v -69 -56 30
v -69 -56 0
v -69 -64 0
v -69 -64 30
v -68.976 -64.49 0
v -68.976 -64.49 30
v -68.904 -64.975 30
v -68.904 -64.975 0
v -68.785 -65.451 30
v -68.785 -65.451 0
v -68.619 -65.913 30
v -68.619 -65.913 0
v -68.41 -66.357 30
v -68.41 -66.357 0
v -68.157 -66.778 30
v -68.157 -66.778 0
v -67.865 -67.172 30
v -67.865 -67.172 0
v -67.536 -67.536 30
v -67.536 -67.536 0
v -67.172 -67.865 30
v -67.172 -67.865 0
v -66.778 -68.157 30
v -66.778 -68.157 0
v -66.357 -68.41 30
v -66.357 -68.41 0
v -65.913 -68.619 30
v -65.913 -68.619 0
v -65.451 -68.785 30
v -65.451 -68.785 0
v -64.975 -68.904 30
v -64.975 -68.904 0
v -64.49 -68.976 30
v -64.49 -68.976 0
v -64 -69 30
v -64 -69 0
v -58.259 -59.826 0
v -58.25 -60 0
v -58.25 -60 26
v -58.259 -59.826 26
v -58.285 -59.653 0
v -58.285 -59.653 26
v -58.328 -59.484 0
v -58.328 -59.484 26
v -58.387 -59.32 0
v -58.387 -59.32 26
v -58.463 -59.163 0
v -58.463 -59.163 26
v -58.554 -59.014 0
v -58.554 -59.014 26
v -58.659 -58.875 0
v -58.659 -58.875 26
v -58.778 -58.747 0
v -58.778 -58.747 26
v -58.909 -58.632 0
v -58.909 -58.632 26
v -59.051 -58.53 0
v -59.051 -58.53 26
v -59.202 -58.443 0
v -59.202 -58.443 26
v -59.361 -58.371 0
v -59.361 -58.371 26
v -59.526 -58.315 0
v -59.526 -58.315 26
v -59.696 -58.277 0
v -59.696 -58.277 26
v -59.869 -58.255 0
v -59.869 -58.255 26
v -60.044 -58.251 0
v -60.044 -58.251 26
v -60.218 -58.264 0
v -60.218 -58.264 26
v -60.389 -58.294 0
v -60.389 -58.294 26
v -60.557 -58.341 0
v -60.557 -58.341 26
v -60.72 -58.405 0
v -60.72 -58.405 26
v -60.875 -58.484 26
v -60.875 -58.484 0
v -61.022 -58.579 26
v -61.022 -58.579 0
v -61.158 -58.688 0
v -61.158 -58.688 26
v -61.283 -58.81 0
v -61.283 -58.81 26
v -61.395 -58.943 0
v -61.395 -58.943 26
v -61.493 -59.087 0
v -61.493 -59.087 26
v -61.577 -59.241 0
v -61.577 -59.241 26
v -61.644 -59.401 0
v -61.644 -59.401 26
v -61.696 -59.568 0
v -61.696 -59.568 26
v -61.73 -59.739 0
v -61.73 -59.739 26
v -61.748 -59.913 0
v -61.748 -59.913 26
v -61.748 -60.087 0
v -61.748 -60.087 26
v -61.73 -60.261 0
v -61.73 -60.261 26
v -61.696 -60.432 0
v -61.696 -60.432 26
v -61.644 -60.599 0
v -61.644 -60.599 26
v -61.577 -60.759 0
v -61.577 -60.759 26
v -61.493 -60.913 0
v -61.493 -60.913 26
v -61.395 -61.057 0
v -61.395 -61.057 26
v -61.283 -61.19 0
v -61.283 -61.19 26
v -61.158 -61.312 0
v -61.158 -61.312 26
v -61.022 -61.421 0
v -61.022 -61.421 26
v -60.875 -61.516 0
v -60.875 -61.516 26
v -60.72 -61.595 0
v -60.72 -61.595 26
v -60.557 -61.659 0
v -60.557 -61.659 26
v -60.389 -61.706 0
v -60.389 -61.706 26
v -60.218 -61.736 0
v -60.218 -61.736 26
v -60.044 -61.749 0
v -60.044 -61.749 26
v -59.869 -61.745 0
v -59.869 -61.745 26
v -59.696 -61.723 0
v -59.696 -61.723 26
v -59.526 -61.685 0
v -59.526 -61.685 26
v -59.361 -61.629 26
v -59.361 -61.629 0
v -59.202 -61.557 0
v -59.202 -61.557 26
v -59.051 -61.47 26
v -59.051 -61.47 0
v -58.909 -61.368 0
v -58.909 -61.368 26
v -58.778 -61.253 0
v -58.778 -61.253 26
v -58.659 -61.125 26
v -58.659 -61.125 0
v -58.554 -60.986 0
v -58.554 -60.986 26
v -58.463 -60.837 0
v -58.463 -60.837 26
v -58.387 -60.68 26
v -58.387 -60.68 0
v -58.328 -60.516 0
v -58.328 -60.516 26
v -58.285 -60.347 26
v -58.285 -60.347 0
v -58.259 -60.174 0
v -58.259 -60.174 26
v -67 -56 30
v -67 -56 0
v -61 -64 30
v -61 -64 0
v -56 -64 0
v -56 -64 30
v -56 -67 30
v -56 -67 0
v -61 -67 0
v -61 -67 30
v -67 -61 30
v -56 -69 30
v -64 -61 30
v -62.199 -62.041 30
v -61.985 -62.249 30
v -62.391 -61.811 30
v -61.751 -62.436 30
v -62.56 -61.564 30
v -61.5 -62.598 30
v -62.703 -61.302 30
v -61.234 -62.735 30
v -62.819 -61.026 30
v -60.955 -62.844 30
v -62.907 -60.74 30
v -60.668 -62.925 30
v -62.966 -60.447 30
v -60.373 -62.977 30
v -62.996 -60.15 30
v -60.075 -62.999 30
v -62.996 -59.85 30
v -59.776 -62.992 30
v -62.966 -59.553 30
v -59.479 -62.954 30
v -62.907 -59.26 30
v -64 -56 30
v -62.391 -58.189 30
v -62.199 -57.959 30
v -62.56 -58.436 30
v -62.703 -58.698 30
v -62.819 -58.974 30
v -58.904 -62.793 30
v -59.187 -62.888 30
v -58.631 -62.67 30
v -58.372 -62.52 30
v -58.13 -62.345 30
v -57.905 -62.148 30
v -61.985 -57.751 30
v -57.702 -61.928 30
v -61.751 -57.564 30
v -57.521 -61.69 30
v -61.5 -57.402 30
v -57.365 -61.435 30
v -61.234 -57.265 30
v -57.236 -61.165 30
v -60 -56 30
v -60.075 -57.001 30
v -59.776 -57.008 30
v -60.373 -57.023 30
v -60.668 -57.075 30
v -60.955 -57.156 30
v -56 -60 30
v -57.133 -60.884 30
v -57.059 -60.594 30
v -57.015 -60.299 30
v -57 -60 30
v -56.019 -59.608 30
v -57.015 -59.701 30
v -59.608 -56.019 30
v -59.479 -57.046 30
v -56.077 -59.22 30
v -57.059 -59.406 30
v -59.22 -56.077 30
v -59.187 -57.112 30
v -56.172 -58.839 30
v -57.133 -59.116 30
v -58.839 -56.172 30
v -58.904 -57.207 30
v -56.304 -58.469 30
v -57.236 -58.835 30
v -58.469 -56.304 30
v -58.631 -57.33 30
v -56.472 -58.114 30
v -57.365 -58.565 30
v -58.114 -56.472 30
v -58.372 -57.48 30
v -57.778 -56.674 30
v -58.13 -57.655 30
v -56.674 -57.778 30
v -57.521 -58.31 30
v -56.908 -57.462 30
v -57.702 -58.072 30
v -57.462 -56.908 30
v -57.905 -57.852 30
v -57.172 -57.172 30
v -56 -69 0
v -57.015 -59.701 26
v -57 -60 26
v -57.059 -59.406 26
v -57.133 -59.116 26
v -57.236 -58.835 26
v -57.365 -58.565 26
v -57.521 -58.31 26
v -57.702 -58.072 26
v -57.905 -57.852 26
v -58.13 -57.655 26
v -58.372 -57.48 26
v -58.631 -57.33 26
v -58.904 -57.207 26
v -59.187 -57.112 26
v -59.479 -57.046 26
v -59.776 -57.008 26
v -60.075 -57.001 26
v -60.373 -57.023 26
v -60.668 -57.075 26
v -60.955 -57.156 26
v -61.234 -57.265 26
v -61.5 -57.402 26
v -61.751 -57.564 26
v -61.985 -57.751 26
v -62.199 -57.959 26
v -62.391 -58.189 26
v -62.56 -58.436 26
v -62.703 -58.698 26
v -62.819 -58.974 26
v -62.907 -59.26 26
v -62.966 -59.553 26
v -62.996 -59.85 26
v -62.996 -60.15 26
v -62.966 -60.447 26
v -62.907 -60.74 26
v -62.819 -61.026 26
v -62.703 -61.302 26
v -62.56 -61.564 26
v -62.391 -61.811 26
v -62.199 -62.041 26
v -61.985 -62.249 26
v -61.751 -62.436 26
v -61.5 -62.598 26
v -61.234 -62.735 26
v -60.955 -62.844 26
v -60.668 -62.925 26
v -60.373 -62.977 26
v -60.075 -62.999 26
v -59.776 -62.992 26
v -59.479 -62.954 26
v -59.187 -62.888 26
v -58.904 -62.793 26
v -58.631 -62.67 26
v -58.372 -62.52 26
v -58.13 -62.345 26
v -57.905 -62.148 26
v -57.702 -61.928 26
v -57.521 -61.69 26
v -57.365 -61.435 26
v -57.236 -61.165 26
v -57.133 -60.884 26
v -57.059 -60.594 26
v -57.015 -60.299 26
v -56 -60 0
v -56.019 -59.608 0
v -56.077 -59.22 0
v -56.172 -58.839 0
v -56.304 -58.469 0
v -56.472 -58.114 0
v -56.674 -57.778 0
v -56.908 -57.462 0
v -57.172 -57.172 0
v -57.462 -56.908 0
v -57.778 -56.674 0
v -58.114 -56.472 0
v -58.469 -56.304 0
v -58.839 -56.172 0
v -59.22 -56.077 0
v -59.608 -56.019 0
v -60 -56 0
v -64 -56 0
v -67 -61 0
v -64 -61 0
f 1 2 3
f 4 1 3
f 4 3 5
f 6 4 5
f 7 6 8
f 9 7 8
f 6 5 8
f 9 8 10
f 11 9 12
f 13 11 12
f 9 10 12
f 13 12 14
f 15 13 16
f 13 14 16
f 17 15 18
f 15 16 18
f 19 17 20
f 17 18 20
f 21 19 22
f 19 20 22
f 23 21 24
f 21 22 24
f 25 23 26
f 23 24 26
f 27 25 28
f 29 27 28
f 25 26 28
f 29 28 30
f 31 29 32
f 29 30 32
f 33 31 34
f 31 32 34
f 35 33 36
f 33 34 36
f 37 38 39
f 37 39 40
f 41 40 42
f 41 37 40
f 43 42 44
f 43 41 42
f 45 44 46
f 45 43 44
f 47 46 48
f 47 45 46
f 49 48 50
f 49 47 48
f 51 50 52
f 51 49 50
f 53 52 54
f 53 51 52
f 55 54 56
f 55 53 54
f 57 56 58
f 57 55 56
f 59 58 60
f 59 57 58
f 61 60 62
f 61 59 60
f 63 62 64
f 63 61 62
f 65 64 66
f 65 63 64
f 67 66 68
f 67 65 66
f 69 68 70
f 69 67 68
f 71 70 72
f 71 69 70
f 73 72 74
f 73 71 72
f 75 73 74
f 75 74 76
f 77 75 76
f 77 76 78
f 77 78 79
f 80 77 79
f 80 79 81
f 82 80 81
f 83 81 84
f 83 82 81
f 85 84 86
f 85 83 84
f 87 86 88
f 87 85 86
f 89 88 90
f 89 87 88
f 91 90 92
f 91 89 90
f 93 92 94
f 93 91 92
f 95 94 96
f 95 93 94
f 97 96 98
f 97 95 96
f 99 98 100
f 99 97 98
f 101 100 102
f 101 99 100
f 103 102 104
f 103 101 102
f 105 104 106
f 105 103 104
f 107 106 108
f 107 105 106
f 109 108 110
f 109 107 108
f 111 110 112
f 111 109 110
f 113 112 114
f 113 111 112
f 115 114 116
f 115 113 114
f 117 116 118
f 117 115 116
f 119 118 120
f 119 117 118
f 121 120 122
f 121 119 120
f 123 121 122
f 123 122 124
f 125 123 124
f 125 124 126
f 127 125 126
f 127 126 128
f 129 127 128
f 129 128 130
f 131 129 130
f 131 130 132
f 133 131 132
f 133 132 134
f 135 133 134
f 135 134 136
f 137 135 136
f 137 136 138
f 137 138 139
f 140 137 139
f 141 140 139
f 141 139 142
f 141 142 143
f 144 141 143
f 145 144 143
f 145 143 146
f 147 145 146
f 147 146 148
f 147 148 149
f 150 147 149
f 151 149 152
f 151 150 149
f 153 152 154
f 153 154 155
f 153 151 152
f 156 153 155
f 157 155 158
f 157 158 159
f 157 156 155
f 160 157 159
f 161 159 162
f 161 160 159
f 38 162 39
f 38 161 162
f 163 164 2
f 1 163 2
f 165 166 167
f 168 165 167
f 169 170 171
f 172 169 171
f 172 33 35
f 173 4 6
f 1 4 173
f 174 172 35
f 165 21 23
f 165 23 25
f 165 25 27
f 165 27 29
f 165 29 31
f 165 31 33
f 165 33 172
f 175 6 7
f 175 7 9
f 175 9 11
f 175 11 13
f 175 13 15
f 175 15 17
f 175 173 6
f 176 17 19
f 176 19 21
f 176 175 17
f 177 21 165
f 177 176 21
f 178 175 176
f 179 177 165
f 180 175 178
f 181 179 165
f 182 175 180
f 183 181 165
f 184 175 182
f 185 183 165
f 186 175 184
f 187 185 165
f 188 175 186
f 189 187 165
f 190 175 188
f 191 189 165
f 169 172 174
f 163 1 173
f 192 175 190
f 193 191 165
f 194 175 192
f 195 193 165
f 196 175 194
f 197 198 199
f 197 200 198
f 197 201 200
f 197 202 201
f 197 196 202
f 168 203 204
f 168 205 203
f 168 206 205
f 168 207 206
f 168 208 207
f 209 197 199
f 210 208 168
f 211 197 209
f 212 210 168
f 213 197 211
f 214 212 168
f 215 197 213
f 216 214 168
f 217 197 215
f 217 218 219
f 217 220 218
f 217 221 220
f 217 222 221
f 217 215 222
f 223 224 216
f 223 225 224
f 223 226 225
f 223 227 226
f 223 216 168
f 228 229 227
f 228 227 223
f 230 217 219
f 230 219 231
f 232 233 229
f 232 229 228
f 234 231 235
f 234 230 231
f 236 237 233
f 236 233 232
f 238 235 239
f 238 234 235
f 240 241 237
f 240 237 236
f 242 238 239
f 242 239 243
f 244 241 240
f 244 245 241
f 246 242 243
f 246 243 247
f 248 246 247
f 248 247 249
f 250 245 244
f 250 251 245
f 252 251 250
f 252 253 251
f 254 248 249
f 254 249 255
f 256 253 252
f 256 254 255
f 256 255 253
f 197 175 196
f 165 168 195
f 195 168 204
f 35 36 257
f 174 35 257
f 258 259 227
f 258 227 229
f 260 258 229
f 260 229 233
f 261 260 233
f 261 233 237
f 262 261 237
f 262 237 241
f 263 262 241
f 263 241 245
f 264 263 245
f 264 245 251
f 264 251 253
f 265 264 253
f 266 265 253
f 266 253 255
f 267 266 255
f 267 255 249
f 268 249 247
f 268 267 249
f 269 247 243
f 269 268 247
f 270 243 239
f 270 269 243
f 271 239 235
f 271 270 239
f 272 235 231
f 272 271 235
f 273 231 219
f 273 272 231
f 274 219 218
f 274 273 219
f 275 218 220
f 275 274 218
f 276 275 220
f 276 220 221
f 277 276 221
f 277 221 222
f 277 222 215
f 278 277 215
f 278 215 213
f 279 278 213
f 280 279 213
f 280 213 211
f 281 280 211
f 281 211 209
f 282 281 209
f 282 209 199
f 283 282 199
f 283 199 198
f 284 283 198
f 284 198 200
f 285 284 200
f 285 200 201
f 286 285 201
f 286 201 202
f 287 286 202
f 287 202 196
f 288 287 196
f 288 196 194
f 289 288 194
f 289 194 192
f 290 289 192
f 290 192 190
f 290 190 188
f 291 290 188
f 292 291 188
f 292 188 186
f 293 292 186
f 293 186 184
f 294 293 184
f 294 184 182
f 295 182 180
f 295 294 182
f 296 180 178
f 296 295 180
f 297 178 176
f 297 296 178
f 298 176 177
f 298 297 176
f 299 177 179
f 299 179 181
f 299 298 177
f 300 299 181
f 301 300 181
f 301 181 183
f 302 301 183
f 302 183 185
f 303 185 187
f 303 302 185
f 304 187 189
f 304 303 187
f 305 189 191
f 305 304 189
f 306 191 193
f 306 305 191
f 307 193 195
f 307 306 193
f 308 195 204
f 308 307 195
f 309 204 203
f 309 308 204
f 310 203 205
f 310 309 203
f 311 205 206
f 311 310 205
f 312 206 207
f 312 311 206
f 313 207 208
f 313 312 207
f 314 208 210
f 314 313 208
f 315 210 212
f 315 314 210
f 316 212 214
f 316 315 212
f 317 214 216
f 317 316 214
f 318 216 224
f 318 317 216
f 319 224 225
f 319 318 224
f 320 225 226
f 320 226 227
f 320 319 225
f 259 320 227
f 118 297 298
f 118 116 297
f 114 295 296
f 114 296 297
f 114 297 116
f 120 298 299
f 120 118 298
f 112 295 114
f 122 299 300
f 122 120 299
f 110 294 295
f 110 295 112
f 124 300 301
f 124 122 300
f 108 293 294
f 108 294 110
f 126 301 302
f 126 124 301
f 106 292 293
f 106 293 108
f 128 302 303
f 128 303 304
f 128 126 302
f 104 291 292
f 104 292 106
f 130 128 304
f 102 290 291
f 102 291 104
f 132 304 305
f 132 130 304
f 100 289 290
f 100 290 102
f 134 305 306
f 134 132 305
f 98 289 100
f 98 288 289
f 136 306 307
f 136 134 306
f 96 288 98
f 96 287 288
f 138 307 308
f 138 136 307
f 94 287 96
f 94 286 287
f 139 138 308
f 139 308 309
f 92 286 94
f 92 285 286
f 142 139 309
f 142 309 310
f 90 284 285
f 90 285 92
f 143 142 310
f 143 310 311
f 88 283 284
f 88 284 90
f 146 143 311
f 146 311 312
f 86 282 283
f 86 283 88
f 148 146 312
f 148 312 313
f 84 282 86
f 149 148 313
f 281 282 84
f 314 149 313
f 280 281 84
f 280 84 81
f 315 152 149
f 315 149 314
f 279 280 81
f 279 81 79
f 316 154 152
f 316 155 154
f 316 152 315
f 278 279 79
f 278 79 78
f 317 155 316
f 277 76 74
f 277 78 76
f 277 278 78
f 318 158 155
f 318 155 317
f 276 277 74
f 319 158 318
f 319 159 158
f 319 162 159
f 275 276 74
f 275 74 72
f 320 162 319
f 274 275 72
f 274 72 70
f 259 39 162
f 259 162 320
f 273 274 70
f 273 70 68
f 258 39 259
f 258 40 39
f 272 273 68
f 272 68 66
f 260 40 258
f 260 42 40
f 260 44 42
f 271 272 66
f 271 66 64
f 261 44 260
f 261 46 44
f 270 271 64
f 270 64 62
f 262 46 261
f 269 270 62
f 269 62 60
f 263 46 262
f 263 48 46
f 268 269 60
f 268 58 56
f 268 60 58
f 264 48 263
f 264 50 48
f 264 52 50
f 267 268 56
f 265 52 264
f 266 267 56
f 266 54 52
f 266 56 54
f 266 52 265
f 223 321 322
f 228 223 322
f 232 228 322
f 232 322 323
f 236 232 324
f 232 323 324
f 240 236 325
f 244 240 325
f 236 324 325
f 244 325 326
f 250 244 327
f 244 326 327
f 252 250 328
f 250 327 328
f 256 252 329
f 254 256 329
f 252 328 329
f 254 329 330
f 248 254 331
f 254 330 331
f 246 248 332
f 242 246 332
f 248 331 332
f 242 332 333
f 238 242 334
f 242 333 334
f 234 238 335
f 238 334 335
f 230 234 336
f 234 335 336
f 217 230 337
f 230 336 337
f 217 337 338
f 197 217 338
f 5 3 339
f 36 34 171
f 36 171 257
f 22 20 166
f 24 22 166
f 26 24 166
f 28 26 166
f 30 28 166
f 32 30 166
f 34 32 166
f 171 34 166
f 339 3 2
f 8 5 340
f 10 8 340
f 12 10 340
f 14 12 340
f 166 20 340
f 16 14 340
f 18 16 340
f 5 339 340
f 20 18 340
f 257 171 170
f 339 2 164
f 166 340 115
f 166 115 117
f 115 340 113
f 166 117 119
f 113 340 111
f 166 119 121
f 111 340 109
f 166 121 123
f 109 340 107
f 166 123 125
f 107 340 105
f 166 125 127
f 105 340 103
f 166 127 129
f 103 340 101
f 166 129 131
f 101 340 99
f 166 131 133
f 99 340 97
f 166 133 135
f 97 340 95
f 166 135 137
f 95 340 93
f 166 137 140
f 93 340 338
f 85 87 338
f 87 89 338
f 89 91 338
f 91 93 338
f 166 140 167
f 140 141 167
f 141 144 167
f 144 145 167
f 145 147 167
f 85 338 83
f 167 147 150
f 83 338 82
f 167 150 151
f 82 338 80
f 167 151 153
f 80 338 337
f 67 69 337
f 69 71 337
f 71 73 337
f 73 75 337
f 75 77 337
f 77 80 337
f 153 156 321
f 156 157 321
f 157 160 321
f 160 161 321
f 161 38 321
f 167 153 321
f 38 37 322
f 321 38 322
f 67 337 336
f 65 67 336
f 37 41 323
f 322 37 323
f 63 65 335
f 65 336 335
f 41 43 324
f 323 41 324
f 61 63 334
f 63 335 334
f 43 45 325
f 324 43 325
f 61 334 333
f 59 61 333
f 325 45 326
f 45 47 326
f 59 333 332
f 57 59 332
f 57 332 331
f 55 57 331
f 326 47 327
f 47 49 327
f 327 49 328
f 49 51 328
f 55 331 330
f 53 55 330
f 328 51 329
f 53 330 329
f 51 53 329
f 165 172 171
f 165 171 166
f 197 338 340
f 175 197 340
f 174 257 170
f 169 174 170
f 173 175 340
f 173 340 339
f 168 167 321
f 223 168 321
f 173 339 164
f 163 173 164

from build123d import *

# Parameters (mm, degrees)
F0_R     = 3
F1_DEPTH = 30
F0_R_2   = 1.75
F2_DEPTH = 26


with BuildPart() as f1:
    # F0 (on Top) → F1 (new body)
    with BuildSketch(Plane.XY):
        with BuildLine():
            ThreePointArc((-60, -64), (-57.1715728753, -62.8284271247), (-56, -60))
            ThreePointArc((-56, -60), (-57.1715728753, -57.1715728753), (-60, -56))
            ThreePointArc((-60, -56), (-62.8284271247, -57.1715728753), (-64, -60))
            ThreePointArc((-64, -60), (-62.8284271247, -62.8284271247), (-60, -64))
        make_face()
        with Locations((-60, -60)):
            Circle(F0_R, mode=Mode.SUBTRACT)
        with BuildLine():
            ThreePointArc((-64, -60), (-62.8284271247, -57.1715728753), (-60, -56))
            Line((-60, -56), (-64, -56))
            Line((-64, -56), (-64, -60))
        make_face()
        with BuildLine():
            Line((-61, -64), (-60, -64))
            ThreePointArc((-60, -64), (-62.8284271247, -62.8284271247), (-64, -60))
            Line((-64, -60), (-64, -61))
            Line((-64, -61), (-67, -61))
            Line((-67, -61), (-67, -56))
            Line((-67, -56), (-69, -56))
            Line((-69, -56), (-69, -64))
            ThreePointArc((-69, -64), (-67.5355339059, -67.5355339059), (-64, -69))
            Line((-64, -69), (-63.9991187476, -69))
            Line((-63.9991187476, -69), (-56, -69))
            Line((-56, -69), (-56, -67))
            Line((-56, -67), (-61, -67))
            Line((-61, -67), (-61, -64))
        make_face()
        with BuildLine():
            Line((-56, -64), (-56, -60))
            ThreePointArc((-56, -60), (-57.1715728753, -62.8284271247), (-60, -64))
            Line((-60, -64), (-56, -64))
        make_face()
    extrude(amount=F1_DEPTH)

    # F0 (on Top) → F2 (join)
    with BuildSketch(Plane.XY):
        with Locations((-60, -60)):
            Circle(F0_R)
        with Locations((-60, -60)):
            Circle(F0_R_2, mode=Mode.SUBTRACT)
    extrude(amount=F2_DEPTH)


solid = f1.part
